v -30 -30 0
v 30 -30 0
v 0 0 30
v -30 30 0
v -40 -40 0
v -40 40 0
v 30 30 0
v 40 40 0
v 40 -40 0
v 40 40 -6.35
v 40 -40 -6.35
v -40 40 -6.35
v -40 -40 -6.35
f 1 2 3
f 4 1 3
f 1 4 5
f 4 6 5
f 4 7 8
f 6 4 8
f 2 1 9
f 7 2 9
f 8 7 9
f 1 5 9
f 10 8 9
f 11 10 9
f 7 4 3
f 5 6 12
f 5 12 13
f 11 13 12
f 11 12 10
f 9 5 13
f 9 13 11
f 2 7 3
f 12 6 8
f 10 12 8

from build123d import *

# Parameters (mm, degrees)
F0_W     = 60
F0_H     = 60
F1_DEPTH = 30
F1_TAPER = 45
F2_W     = 80
F2_H     = 80
F2_W_2   = 60
F2_H_2   = 60
F3_DEPTH = 6.35


with BuildPart() as f1:
    # F0 (on Top) → F1 (new body)
    with BuildSketch(Plane.XY):
        Rectangle(F0_W, F0_H)
    extrude(amount=F1_DEPTH, taper=F1_TAPER)

    # F2 (on face) → F3 (join)
    with BuildSketch(Plane(origin=(0, 0, 0), x_dir=(1, 0, 0), z_dir=(0, 0, -1))):
        Rectangle(F2_W, F2_H)
        Rectangle(F2_W_2, F2_H_2, mode=Mode.SUBTRACT)
        Rectangle(F2_W_2, F2_H_2)
    extrude(amount=F3_DEPTH)


solid = f1.part
